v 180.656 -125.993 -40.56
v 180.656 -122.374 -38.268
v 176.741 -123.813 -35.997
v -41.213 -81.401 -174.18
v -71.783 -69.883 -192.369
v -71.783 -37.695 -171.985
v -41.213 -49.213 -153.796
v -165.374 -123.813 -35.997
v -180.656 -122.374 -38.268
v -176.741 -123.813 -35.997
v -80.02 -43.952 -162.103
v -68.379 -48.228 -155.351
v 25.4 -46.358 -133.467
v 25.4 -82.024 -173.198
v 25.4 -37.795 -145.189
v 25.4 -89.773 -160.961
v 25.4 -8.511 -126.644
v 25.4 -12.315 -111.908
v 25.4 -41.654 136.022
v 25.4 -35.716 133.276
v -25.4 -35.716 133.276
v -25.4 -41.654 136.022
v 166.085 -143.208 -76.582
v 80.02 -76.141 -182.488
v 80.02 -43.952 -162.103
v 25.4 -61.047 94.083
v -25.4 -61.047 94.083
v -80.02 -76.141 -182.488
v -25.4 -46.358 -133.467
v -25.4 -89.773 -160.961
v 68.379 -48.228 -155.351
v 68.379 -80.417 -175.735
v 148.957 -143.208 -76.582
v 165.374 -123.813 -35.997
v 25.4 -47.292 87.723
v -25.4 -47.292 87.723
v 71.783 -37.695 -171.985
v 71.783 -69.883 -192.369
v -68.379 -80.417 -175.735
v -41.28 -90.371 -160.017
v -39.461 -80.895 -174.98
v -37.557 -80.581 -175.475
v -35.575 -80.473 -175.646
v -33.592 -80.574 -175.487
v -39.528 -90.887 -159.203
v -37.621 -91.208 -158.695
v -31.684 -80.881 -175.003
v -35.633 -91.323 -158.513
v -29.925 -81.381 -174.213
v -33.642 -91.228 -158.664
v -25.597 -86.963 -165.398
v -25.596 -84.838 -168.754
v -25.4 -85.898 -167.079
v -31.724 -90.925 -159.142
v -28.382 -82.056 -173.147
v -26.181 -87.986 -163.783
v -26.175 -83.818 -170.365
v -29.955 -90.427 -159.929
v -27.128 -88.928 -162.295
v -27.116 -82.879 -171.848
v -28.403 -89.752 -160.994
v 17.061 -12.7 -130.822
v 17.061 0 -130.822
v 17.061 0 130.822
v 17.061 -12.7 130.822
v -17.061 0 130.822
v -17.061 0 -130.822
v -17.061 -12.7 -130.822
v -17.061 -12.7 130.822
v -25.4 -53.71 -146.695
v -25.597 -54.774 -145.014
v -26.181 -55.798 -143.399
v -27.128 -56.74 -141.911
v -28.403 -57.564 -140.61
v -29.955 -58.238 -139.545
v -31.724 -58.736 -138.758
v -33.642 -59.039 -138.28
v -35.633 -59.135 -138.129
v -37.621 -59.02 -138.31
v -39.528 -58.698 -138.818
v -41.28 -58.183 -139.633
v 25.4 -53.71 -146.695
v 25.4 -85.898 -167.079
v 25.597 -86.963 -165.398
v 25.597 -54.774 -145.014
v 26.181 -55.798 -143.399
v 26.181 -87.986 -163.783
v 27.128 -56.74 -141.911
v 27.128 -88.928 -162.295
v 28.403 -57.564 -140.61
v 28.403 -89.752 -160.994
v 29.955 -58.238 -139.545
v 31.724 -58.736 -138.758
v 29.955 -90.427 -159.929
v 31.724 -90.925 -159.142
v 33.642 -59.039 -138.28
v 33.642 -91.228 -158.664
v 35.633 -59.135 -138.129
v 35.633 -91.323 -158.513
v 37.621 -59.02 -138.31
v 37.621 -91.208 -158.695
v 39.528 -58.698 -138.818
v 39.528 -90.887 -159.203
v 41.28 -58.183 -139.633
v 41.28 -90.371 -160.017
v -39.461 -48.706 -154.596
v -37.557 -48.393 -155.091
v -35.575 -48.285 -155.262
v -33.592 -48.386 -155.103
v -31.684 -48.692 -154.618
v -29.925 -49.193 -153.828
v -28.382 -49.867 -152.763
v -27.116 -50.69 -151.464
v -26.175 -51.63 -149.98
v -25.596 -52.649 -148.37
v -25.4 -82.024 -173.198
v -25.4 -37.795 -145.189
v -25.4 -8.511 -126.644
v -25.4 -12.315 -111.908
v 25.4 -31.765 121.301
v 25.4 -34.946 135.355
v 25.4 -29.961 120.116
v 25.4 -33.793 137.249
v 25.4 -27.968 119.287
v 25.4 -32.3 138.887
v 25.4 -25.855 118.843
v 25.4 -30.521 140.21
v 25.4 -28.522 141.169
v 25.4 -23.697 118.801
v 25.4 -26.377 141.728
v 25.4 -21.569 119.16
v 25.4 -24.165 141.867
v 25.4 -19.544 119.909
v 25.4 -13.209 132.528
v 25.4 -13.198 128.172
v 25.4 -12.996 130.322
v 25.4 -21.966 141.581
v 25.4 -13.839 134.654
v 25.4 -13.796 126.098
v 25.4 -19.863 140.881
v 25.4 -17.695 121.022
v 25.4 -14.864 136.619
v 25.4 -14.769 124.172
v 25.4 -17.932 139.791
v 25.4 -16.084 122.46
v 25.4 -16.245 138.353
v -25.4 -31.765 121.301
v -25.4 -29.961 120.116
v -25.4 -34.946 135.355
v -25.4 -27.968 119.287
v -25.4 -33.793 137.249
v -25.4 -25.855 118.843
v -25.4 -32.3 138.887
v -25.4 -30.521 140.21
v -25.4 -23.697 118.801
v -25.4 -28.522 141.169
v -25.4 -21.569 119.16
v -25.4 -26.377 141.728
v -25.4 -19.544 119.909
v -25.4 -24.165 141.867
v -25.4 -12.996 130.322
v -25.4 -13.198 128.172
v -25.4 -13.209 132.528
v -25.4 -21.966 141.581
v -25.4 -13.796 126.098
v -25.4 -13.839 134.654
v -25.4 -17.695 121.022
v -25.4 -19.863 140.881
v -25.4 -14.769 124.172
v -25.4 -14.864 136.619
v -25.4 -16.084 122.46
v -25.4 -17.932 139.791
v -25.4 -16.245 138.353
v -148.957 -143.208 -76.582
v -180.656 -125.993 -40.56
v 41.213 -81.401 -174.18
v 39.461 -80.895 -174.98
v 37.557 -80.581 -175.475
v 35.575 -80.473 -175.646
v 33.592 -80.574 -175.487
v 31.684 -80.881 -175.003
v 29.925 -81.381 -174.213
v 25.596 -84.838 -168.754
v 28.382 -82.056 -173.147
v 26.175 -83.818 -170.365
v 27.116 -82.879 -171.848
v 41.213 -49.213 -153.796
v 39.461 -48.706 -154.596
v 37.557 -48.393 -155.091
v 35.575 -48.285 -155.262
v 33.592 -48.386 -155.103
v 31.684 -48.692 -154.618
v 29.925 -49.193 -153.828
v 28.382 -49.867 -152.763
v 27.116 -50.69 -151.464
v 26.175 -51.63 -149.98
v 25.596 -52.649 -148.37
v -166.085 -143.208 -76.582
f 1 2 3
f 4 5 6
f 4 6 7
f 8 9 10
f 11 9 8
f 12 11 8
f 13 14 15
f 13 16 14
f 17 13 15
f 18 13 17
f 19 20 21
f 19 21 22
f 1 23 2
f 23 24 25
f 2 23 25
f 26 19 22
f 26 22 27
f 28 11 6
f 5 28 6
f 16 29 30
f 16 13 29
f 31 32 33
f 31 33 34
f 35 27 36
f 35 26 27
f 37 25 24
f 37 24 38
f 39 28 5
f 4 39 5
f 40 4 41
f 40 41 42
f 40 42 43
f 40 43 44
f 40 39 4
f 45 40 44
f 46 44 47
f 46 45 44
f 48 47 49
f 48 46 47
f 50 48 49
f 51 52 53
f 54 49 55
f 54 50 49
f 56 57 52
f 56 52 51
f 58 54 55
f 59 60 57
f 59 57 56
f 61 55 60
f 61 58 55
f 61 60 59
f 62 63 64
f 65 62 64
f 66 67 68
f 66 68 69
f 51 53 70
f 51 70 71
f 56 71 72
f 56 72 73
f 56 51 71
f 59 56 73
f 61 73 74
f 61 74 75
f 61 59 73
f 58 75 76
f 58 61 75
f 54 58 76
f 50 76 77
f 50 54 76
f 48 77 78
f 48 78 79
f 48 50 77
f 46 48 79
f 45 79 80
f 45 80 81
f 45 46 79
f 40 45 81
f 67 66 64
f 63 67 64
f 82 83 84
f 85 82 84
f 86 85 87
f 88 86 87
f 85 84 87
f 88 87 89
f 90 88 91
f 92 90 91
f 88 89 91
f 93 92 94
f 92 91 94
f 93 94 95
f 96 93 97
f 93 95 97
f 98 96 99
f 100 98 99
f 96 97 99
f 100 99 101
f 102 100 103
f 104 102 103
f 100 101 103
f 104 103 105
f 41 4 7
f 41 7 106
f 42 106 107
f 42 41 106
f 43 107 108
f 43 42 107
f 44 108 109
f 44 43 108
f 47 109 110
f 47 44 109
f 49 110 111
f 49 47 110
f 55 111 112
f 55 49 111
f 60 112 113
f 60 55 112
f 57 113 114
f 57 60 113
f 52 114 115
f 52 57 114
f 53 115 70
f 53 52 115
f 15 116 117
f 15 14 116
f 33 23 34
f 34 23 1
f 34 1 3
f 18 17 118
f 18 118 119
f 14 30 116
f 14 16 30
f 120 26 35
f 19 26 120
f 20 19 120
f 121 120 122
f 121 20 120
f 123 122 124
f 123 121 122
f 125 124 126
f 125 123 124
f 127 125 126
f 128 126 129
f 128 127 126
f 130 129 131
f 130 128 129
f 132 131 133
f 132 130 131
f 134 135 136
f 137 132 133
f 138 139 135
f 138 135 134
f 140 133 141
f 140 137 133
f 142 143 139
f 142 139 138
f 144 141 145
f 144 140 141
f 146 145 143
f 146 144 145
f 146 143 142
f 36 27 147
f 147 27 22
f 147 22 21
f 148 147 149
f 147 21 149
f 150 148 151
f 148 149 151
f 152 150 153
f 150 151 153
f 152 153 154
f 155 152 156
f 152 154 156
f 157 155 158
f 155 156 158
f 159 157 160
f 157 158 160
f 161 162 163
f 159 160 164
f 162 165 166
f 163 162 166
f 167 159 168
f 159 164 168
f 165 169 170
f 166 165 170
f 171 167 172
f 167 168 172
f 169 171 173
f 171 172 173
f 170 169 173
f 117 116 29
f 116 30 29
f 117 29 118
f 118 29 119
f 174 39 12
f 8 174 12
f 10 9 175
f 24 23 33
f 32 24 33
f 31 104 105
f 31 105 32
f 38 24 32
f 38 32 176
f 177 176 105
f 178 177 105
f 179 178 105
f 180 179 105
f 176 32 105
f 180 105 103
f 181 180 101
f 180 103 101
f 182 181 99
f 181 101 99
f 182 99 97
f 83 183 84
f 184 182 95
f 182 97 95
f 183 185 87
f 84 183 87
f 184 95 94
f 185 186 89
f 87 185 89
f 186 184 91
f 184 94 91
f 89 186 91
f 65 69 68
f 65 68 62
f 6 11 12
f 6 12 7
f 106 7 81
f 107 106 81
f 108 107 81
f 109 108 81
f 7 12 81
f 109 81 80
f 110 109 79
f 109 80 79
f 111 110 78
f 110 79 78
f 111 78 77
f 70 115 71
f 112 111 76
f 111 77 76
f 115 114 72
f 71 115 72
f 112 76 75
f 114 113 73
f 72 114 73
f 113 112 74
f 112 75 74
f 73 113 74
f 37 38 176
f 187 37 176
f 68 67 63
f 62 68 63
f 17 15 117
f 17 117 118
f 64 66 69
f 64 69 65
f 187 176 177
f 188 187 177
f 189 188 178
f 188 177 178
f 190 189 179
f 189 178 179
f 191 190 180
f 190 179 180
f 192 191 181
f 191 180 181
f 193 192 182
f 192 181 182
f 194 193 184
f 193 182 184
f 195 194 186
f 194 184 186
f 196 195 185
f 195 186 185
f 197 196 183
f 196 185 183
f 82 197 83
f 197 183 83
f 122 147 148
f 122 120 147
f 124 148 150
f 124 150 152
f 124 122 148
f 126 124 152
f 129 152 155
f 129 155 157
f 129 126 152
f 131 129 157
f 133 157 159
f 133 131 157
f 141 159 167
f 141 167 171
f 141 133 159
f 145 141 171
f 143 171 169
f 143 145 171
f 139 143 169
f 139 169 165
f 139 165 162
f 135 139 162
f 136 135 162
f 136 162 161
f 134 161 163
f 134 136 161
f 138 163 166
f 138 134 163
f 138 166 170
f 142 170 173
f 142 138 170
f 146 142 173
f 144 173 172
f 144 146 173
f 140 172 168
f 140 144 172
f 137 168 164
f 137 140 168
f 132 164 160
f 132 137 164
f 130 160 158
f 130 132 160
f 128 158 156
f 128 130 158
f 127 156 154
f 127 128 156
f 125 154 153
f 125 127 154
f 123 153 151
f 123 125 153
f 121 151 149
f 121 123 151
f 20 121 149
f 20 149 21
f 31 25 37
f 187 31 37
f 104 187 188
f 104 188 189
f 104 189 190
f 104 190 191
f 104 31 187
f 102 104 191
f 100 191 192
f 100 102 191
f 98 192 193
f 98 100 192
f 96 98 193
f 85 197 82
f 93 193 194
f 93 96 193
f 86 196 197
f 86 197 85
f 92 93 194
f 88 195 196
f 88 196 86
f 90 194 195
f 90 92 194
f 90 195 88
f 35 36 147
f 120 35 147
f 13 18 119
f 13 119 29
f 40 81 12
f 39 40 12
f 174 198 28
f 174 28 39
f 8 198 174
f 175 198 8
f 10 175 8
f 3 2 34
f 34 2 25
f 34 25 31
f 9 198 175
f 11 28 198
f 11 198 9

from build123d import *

# Parameters (mm, degrees)
F0_W           = 34.1221652925
F0_H           = 261.6441845894
F1_DEPTH       = 12.7
F3_DEPTH       = 25.4
F3_DEPTH_BACK  = 25.4
F7_DEPTH       = 25.4
F7_DEPTH_BACK  = 25.4
F9_DEPTH       = 38.1
F11_W          = 14.1206162959
F11_H          = 38.1
F12_DEPTH      = 177.8
F15_DEPTH      = 508
F15_DEPTH_BACK = 508
F20_DEPTH      = 228.6
F20_DEPTH_BACK = 228.6


with BuildPart() as f1:
    # F0 (on Front) → F1 (new body)
    with BuildSketch(Plane.XZ):
        Rectangle(F0_W, F0_H)
    extrude(amount=F1_DEPTH)


with BuildPart() as f3:
    # F2 (on Right) → F3 (new body, two sides)
    with BuildSketch(Plane.YZ) as f3_sk:
        with BuildLine():
            ThreePointArc((-31.7653294782, 121.3009119591), (-19.5443195923, 119.9093799667), (-12.9962554201, 130.3215026855))
            ThreePointArc((-12.9962554201, 130.3215026855), (-23.058684097, 141.777262991), (-35.7164542609, 133.2762177888))
            ThreePointArc((-35.7164542609, 133.2762177888), (-35.5190055596, 126.7018951749), (-31.7653294782, 121.3009119591))
        make_face()
        with BuildLine():
            ThreePointArc((-31.7653294782, 121.3009119591), (-35.5190055596, 126.7018951749), (-35.7164542609, 133.2762177888))
            Line((-35.7164542609, 133.2762177888), (-41.654221951, 136.0218451646))
            Line((-41.654221951, 136.0218451646), (-61.046799285, 94.0829352683))
            Line((-61.046799285, 94.0829352683), (-47.2919270396, 87.7226740122))
            Line((-47.2919270396, 87.7226740122), (-31.7653294782, 121.3009119591))
        make_face()
    extrude(amount=F3_DEPTH)
    extrude(f3_sk.sketch, amount=-F3_DEPTH_BACK)


with BuildPart() as f4_1:
    # F4: instance of F3
    add(f3.part.mirror(Plane.XY))


with BuildPart() as f7:
    # F6 (on Right) → F7 (new body, two sides)
    with BuildSketch(Plane.YZ) as f7_sk:
        Polygon((-82.0237547159, -173.1977909803), (-37.7950449612, -145.1887713173), (-8.5108920135, -126.643794078), (-12.3146369824, -111.9083875607), (-46.3577486399, -133.4671033607), (-89.7730322343, -160.9609990365), align=None)
    extrude(amount=F7_DEPTH)
    extrude(f7_sk.sketch, amount=-F7_DEPTH_BACK)


with BuildPart() as f9:
    # F8 (on face) → F9 (new body)
    with BuildSketch(Plane(origin=(0, -136.8311862758, -86.652027793), x_dir=(1, 0, 0), z_dir=(0, -0.8448406307, -0.5350180453))):
        with BuildLine():
            ThreePointArc((-41.2132547892, -103.603452681), (-30.7810506283, -104.152405518), (-25.4, -95.198270886))
            ThreePointArc((-25.4, -95.198270886), (-30.8167276914, -86.225263874), (-41.2799833491, -86.8385132228))
            ThreePointArc((-41.2799833491, -86.8385132228), (-45.680760801, -95.2386319206), (-41.2132547892, -103.603452681))
        make_face()
        with BuildLine():
            ThreePointArc((-41.2132547892, -103.603452681), (-45.680760801, -95.2386319206), (-41.2799833491, -86.8385132228))
            Line((-41.2799833491, -86.8385132228), (-80.0200754217, -113.4363166259))
            Line((-80.0200754217, -113.4363166259), (-71.7834234238, -125.1321434975))
            Line((-71.7834234238, -125.1321434975), (-41.2132547892, -103.603452681))
        make_face()
    extrude(amount=-F9_DEPTH)


with BuildPart() as f10_1:
    # F10: instance of F9
    add(f9.part.mirror(Plane.YZ))


with BuildPart() as f9_1:
    add(f9.part)

    # F11 (on face) → F12 (join)
    with BuildSketch(Plane(origin=(27.2956463477, 21.2704505823, -33.5879154814), x_dir=(0.8243995022, -0.302824685, 0.4781868578), z_dir=(-0.5660083575, -0.4410686102, 0.6964861954))):
        with Locations((-123.1141054526, -142.9109442375)):
            Rectangle(F11_W, F11_H)
    extrude(amount=F12_DEPTH)


with BuildPart() as f13_1:
    # F13: instance of F9
    add(f9_1.part.mirror(Plane.YZ))


with BuildPart() as f15_tool:
    # F14 (on Right) → F15 (new body, two sides)
    with BuildSketch(Plane.YZ) as f15_sk:
        Polygon((-170.909717679, -134.5487385988), (-87.3836744508, 40.231739617), (-170.909717679, 47.1544340253), align=None)
    extrude(amount=-F15_DEPTH)
    extrude(f15_sk.sketch, amount=F15_DEPTH_BACK)


with BuildPart() as f9_2:
    add(f9_1.part)

    # F15: cut by f15_tool
    add(f15_tool.part, mode=Mode.SUBTRACT)


with BuildPart() as f13_1_1:
    add(f13_1.part)

    # F15: cut by f15_tool
    add(f15_tool.part, mode=Mode.SUBTRACT)


with BuildPart() as f18_1:
    # F18: instance of F9
    add(f9_2.part.mirror(Plane.YZ))


with BuildPart() as f20:
    # F19 (on Right) → F20 (new body, two sides)
    with BuildSketch(Plane.YZ) as f20_sk:
        Polygon((-175.9073315984, -141.5651084215), (-144.9963003397, -76.4395818114), (-43.3924645185, 137.6264989376), (-107.6736316351, 168.8955078974), (-240.4824132121, -110.9153391191), align=None)
    extrude(amount=F20_DEPTH)
    extrude(f20_sk.sketch, amount=-F20_DEPTH_BACK)


solid = Compound([f1.part, f3.part, f7.part, f9_2.part, f18_1.part])
